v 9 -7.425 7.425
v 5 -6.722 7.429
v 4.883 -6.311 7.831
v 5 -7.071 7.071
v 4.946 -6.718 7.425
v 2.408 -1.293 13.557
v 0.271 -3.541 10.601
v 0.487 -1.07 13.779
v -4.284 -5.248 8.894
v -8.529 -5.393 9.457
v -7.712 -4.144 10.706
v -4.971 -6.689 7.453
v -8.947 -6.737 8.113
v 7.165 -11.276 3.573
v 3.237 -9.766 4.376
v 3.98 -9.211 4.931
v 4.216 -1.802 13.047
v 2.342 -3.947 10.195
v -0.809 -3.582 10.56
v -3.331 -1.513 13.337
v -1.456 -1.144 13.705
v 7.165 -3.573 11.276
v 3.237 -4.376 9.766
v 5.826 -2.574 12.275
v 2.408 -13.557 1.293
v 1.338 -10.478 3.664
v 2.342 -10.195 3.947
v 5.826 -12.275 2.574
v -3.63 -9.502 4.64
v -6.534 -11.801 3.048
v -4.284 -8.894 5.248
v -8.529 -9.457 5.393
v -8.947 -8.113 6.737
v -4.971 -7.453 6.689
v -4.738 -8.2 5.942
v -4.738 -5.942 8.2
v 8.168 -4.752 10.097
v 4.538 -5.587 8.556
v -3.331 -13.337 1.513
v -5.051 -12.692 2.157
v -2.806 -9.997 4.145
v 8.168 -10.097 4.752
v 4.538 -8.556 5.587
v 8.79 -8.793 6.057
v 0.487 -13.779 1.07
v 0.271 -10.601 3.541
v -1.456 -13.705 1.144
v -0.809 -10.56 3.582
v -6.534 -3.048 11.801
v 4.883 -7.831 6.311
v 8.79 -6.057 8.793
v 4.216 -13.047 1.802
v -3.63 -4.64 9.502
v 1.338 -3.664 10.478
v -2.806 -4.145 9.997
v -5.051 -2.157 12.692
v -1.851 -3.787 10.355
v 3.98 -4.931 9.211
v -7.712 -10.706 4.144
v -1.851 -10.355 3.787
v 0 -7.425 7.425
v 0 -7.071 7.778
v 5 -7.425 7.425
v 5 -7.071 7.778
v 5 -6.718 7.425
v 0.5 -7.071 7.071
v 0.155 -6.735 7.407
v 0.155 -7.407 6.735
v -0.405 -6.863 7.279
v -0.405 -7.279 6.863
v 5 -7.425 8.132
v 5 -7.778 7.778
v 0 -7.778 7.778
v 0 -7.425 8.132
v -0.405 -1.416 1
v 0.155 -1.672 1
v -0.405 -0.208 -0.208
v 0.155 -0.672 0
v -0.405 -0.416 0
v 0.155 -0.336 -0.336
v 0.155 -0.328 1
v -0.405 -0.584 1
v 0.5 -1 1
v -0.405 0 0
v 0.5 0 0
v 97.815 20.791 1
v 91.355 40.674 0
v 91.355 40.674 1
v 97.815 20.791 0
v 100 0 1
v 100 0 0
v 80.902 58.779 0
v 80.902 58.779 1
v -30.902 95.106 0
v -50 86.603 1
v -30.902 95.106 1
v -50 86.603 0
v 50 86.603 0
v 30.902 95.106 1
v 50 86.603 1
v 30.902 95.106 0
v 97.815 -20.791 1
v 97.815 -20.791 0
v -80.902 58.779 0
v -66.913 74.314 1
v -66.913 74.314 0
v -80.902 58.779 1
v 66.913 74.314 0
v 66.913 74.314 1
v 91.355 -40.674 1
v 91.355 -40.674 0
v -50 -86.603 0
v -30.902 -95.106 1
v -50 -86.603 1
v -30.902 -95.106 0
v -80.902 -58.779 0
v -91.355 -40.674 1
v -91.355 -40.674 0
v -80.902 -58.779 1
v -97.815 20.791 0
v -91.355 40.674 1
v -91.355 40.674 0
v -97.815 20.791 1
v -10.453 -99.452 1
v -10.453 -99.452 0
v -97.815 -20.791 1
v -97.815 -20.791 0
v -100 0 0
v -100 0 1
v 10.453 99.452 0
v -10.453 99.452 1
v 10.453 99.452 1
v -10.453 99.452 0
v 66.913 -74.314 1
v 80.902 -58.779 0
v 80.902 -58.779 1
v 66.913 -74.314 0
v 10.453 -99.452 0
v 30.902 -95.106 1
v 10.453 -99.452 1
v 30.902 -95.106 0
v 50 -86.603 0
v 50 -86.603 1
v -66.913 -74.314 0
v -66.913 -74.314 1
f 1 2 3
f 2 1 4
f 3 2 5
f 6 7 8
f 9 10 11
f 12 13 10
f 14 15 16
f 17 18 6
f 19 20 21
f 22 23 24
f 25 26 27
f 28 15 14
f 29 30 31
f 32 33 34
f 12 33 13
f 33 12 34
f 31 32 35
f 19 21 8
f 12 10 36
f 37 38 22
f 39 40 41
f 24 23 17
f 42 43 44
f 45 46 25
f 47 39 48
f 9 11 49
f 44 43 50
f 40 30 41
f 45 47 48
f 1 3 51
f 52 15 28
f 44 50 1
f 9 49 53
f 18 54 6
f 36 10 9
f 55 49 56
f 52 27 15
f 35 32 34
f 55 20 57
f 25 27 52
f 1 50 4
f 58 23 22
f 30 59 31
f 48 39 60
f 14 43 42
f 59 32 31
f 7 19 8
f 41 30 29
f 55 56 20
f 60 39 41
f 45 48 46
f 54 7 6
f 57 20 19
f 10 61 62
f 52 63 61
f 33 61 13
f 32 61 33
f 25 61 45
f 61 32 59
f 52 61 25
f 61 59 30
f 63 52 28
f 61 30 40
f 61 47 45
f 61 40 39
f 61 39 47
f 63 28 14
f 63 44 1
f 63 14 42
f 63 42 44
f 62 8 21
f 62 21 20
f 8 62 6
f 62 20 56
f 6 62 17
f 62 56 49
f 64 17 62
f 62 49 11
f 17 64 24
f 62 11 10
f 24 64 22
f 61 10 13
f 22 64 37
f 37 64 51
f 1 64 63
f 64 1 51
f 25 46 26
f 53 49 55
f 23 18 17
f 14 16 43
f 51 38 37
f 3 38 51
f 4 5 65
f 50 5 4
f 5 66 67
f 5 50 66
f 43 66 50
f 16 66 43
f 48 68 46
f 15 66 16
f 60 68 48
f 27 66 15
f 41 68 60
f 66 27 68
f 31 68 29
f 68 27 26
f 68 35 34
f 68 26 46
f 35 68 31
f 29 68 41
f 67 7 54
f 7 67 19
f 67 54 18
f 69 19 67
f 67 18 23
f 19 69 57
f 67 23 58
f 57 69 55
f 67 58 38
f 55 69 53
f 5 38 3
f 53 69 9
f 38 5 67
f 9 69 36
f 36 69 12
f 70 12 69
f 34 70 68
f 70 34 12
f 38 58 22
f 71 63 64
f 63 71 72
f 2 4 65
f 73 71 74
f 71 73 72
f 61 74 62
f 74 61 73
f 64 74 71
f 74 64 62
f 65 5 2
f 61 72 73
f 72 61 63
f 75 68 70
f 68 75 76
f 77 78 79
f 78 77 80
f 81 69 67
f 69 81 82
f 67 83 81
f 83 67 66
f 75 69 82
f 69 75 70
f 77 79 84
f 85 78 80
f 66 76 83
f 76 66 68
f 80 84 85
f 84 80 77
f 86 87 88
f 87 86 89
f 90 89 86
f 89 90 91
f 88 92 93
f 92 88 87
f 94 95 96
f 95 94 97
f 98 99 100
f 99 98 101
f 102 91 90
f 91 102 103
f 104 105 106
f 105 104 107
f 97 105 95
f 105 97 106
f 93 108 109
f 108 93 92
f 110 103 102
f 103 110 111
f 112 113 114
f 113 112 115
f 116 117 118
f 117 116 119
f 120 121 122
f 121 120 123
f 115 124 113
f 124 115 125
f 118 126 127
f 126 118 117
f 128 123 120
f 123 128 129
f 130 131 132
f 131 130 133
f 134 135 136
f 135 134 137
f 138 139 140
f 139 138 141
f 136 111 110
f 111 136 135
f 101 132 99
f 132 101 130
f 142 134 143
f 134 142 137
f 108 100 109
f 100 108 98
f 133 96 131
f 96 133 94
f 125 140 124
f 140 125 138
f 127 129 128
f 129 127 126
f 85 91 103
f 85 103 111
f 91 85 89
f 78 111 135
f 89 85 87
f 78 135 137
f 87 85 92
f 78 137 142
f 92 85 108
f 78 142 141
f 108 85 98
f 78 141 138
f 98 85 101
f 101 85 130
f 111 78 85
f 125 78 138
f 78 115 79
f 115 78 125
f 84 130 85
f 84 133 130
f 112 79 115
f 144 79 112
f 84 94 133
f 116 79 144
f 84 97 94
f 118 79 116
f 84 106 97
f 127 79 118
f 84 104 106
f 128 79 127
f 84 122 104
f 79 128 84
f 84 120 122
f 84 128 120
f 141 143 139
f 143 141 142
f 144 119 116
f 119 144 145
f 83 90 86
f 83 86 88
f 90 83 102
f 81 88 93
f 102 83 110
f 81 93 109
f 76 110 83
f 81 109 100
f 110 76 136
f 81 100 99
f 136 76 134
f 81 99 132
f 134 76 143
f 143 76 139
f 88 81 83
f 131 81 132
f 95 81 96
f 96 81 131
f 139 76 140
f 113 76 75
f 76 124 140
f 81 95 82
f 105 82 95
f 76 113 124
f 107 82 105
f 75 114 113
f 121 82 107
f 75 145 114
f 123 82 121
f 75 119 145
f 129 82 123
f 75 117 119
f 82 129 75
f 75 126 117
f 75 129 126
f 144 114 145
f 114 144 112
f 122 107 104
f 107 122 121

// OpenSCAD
rotate([0,0,$t*360])
union(){
    rotate([45, 0, 0])
    union(){
        cylinder(10, 0.5, 0.5);
        translate([0,0,10])
        rotate(a = -$t*360, v = [0.1*cos($t*360), 0.1*sin($t*360), 10]) 
        union(){    
            cylinder(0.5, 5, 9);
            color("Red") cube([5,0.5,1]);
        }    
    }
}   

color([0.5, 0.5, 0.5, 0.8]) cylinder(1,100,100);
